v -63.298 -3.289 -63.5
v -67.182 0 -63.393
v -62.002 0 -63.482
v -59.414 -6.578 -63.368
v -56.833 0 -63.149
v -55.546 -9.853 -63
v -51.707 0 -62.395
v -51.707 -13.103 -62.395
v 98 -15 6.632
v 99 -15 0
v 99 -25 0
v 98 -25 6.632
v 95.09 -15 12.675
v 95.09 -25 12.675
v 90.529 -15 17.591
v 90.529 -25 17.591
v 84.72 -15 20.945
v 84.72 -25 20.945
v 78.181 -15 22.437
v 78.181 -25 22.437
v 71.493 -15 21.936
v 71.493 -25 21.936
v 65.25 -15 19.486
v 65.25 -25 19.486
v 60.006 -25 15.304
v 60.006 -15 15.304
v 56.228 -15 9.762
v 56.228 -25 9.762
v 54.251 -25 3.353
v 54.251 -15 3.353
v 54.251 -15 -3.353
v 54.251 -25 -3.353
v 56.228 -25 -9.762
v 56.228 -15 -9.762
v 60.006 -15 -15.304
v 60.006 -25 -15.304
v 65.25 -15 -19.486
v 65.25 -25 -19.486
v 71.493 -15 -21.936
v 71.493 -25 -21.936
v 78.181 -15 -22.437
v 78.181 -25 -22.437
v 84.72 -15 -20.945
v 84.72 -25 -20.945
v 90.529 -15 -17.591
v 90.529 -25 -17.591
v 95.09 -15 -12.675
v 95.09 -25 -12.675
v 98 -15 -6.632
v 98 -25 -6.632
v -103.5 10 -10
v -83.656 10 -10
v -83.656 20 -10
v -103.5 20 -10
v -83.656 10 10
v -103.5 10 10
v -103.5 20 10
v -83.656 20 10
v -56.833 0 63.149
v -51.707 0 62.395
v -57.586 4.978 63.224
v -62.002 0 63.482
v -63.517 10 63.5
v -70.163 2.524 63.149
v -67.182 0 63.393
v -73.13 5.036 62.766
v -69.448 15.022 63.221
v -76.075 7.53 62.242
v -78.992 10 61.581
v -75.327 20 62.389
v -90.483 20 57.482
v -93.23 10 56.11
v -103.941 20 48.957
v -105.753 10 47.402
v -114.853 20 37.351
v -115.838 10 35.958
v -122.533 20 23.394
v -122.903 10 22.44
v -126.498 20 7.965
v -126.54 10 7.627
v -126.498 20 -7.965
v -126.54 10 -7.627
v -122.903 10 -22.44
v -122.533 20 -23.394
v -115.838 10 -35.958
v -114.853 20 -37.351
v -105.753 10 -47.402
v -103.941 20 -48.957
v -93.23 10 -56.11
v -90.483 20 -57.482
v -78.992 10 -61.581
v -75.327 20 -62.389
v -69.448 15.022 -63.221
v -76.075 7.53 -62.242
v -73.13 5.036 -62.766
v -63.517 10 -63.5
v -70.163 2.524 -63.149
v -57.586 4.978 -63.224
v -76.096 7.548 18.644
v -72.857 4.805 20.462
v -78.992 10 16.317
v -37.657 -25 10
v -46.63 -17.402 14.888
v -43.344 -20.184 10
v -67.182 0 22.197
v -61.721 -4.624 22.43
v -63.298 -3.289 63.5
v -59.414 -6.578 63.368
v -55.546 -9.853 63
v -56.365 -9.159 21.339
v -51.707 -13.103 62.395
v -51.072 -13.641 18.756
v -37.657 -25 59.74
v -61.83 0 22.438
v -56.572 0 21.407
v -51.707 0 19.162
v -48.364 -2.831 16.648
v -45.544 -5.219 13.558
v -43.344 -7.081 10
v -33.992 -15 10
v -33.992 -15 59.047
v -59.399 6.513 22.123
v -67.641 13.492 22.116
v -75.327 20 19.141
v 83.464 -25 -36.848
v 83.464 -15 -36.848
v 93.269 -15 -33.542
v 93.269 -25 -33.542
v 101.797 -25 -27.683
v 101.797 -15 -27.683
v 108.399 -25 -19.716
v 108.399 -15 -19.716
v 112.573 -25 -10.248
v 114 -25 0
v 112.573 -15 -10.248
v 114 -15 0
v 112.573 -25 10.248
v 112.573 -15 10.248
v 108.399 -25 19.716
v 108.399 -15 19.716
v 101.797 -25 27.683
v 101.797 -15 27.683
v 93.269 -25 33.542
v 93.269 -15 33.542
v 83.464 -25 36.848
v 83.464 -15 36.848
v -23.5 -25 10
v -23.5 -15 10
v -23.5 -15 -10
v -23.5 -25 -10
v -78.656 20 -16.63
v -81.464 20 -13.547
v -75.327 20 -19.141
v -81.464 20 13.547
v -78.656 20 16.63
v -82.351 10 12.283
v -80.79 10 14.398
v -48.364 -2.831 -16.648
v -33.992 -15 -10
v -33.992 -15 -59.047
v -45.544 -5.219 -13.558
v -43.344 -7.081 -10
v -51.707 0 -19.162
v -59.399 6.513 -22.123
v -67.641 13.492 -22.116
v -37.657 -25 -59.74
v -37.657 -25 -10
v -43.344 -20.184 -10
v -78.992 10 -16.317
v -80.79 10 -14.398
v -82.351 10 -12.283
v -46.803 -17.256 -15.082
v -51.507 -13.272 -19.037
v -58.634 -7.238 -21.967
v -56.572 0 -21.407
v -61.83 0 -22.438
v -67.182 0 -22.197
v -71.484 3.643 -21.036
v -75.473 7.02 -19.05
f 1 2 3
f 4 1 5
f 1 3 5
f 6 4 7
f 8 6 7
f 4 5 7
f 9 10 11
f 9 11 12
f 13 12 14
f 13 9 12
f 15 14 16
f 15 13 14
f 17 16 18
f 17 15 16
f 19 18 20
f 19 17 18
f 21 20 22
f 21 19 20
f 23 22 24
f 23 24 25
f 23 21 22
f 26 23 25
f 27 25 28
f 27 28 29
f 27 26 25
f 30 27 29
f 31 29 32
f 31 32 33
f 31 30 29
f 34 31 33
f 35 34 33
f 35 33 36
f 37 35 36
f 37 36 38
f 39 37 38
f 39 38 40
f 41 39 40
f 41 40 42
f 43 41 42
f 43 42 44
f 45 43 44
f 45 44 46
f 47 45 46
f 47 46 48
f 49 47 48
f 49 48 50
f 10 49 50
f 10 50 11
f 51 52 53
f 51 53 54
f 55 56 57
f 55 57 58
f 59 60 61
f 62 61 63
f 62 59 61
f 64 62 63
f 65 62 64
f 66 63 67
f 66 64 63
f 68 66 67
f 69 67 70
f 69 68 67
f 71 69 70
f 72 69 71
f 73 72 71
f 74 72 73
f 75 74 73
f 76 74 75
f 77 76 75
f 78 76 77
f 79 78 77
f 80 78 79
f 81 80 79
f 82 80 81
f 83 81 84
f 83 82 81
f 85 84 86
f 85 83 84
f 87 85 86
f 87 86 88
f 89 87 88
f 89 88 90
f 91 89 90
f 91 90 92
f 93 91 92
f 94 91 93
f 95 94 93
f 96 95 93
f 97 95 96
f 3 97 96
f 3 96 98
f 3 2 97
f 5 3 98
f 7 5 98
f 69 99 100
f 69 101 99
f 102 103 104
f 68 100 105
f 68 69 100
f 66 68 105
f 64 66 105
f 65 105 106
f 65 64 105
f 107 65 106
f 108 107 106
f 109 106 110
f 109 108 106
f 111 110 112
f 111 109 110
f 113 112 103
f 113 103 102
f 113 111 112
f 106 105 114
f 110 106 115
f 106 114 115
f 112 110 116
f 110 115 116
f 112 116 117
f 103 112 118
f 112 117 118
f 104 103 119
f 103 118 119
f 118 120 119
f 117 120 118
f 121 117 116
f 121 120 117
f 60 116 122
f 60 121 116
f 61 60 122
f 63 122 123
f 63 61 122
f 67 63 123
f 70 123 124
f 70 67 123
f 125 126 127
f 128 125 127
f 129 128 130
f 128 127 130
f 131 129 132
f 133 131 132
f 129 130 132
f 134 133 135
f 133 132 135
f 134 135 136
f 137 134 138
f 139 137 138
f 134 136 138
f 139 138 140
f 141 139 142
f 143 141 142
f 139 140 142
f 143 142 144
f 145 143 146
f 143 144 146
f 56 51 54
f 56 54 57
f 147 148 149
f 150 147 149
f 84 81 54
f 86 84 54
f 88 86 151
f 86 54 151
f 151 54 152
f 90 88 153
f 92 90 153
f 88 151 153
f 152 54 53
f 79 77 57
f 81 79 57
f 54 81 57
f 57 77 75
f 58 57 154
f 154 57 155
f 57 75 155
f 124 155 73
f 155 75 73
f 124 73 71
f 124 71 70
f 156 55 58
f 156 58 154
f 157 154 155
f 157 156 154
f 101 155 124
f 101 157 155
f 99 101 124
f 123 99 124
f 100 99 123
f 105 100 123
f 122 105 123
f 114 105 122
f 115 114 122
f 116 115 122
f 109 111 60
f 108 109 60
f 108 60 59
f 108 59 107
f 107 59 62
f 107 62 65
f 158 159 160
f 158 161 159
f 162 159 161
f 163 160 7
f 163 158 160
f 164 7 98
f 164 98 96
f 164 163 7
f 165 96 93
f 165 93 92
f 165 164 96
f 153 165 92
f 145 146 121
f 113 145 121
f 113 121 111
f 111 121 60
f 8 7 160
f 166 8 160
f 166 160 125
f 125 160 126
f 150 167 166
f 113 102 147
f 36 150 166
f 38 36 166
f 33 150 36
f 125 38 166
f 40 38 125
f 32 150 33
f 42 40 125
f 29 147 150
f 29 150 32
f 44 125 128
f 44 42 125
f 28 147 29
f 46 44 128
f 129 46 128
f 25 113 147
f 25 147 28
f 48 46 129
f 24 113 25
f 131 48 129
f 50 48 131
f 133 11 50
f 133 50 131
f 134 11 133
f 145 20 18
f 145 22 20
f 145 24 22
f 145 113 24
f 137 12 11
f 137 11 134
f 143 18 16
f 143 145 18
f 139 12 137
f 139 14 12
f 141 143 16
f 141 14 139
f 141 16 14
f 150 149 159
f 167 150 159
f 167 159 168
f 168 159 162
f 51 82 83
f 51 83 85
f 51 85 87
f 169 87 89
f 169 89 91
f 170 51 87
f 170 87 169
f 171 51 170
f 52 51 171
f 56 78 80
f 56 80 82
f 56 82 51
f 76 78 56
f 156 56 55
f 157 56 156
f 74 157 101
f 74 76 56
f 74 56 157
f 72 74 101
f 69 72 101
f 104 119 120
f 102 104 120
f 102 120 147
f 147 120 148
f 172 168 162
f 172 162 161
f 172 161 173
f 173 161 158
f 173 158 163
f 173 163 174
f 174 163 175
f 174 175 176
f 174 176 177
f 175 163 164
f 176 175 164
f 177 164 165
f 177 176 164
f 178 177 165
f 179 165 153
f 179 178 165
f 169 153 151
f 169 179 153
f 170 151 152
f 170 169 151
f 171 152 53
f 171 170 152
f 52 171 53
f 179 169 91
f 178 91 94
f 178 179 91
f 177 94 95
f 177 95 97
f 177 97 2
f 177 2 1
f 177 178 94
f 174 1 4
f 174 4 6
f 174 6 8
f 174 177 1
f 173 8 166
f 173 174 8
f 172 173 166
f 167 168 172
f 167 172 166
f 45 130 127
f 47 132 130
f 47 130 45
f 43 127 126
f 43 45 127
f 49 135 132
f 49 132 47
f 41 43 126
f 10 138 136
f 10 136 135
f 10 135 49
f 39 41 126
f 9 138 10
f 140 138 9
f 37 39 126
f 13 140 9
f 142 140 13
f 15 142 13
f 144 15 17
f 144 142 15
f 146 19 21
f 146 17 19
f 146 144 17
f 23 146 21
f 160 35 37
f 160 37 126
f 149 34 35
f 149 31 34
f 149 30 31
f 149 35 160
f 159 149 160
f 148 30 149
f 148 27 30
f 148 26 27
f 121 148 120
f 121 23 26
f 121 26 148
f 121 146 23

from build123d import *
from build123d import SkipClean  # not in build123d's __all__

# Parameters (mm, degrees)
F0_R     = 22.5
F1_DEPTH = 25
F2_DEPTH = 20
F4_START = 63.501
F4_DEPTH = 127.002


with BuildPart() as f1:
    # F0 (on Front) → F1 (new body)
    with BuildSketch(Plane.XZ):
        with BuildLine():
            ThreePointArc((-51.7071428571, -62.3953405344), (-14.6067671933, -40.5179193162), (0, 0))
            ThreePointArc((0, 0), (-14.6067671933, 40.5179193162), (-51.7071428571, 62.3953405344))
            ThreePointArc((-51.7071428571, 62.3953405344), (-127, 0), (-51.7071428571, -62.3953405344))
        make_face()
        with BuildLine():
            ThreePointArc((-83.6556443707, 10), (-63.5, 22.5), (-43.3443556293, 10))
            Line((-43.3443556293, 10), (-23.5, 10))
            Line((-23.5, 10), (-23.5, -10))
            Line((-23.5, -10), (-43.3443556293, -10))
            ThreePointArc((-43.3443556293, -10), (-63.5, -22.5), (-83.6556443707, -10))
            Line((-83.6556443707, -10), (-103.5, -10))
            Line((-103.5, -10), (-103.5, 10))
            Line((-103.5, 10), (-83.6556443707, 10))
        make_face(mode=Mode.SUBTRACT)
        with BuildLine():
            ThreePointArc((-51.7071428571, 62.3953405344), (-14.6067671933, 40.5179193162), (0, 0))
            ThreePointArc((0, 0), (-14.6067671933, -40.5179193162), (-51.7071428571, -62.3953405344))
            Line((-51.7071428571, -62.3953405344), (83.4642857143, -36.8476420479))
            ThreePointArc((83.4642857143, -36.8476420479), (39, 0), (83.4642857143, 36.8476420479))
            Line((83.4642857143, 36.8476420479), (-51.7071428571, 62.3953405344))
        make_face()
        with BuildLine():
            ThreePointArc((114, 0), (105.3739563819, 23.927905108), (83.4642857143, 36.8476420479))
            ThreePointArc((83.4642857143, 36.8476420479), (39, 0), (83.4642857143, -36.8476420479))
            ThreePointArc((83.4642857143, -36.8476420479), (105.3739563819, -23.927905108), (114, 0))
        make_face()
        with Locations((76.5, 0)):
            Circle(F0_R, mode=Mode.SUBTRACT)
    extrude(amount=F1_DEPTH)

    # F0 (on Front) → F2 (join)
    with BuildSketch(Plane.XZ):
        with BuildLine():
            ThreePointArc((-51.7071428571, -62.3953405344), (-14.6067671933, -40.5179193162), (0, 0))
            ThreePointArc((0, 0), (-14.6067671933, 40.5179193162), (-51.7071428571, 62.3953405344))
            ThreePointArc((-51.7071428571, 62.3953405344), (-127, 0), (-51.7071428571, -62.3953405344))
        make_face()
        with BuildLine():
            ThreePointArc((-83.6556443707, 10), (-63.5, 22.5), (-43.3443556293, 10))
            Line((-43.3443556293, 10), (-23.5, 10))
            Line((-23.5, 10), (-23.5, -10))
            Line((-23.5, -10), (-43.3443556293, -10))
            ThreePointArc((-43.3443556293, -10), (-63.5, -22.5), (-83.6556443707, -10))
            Line((-83.6556443707, -10), (-103.5, -10))
            Line((-103.5, -10), (-103.5, 10))
            Line((-103.5, 10), (-83.6556443707, 10))
        make_face(mode=Mode.SUBTRACT)
    with SkipClean():  # cleaning this boolean's faces spoils the solid; the shape is the same uncleaned
        extrude(amount=-F2_DEPTH)

    # F3 (on Top) → F4 (intersect)
    with BuildSketch(Plane.XY.offset(F4_START)):
        Polygon((-75.3271334507, 20), (-158.5341542959, 20), (-158.5341542959, 10), (-78.9921499119, 10), (-37.6571663732, -25), (141.5535062551, -25), (141.5535062551, -15), (-33.9921499119, -15), align=None)
    with SkipClean():  # cleaning this boolean's faces spoils the solid; the shape is the same uncleaned
        extrude(amount=-F4_DEPTH, mode=Mode.INTERSECT)


solid = f1.part
